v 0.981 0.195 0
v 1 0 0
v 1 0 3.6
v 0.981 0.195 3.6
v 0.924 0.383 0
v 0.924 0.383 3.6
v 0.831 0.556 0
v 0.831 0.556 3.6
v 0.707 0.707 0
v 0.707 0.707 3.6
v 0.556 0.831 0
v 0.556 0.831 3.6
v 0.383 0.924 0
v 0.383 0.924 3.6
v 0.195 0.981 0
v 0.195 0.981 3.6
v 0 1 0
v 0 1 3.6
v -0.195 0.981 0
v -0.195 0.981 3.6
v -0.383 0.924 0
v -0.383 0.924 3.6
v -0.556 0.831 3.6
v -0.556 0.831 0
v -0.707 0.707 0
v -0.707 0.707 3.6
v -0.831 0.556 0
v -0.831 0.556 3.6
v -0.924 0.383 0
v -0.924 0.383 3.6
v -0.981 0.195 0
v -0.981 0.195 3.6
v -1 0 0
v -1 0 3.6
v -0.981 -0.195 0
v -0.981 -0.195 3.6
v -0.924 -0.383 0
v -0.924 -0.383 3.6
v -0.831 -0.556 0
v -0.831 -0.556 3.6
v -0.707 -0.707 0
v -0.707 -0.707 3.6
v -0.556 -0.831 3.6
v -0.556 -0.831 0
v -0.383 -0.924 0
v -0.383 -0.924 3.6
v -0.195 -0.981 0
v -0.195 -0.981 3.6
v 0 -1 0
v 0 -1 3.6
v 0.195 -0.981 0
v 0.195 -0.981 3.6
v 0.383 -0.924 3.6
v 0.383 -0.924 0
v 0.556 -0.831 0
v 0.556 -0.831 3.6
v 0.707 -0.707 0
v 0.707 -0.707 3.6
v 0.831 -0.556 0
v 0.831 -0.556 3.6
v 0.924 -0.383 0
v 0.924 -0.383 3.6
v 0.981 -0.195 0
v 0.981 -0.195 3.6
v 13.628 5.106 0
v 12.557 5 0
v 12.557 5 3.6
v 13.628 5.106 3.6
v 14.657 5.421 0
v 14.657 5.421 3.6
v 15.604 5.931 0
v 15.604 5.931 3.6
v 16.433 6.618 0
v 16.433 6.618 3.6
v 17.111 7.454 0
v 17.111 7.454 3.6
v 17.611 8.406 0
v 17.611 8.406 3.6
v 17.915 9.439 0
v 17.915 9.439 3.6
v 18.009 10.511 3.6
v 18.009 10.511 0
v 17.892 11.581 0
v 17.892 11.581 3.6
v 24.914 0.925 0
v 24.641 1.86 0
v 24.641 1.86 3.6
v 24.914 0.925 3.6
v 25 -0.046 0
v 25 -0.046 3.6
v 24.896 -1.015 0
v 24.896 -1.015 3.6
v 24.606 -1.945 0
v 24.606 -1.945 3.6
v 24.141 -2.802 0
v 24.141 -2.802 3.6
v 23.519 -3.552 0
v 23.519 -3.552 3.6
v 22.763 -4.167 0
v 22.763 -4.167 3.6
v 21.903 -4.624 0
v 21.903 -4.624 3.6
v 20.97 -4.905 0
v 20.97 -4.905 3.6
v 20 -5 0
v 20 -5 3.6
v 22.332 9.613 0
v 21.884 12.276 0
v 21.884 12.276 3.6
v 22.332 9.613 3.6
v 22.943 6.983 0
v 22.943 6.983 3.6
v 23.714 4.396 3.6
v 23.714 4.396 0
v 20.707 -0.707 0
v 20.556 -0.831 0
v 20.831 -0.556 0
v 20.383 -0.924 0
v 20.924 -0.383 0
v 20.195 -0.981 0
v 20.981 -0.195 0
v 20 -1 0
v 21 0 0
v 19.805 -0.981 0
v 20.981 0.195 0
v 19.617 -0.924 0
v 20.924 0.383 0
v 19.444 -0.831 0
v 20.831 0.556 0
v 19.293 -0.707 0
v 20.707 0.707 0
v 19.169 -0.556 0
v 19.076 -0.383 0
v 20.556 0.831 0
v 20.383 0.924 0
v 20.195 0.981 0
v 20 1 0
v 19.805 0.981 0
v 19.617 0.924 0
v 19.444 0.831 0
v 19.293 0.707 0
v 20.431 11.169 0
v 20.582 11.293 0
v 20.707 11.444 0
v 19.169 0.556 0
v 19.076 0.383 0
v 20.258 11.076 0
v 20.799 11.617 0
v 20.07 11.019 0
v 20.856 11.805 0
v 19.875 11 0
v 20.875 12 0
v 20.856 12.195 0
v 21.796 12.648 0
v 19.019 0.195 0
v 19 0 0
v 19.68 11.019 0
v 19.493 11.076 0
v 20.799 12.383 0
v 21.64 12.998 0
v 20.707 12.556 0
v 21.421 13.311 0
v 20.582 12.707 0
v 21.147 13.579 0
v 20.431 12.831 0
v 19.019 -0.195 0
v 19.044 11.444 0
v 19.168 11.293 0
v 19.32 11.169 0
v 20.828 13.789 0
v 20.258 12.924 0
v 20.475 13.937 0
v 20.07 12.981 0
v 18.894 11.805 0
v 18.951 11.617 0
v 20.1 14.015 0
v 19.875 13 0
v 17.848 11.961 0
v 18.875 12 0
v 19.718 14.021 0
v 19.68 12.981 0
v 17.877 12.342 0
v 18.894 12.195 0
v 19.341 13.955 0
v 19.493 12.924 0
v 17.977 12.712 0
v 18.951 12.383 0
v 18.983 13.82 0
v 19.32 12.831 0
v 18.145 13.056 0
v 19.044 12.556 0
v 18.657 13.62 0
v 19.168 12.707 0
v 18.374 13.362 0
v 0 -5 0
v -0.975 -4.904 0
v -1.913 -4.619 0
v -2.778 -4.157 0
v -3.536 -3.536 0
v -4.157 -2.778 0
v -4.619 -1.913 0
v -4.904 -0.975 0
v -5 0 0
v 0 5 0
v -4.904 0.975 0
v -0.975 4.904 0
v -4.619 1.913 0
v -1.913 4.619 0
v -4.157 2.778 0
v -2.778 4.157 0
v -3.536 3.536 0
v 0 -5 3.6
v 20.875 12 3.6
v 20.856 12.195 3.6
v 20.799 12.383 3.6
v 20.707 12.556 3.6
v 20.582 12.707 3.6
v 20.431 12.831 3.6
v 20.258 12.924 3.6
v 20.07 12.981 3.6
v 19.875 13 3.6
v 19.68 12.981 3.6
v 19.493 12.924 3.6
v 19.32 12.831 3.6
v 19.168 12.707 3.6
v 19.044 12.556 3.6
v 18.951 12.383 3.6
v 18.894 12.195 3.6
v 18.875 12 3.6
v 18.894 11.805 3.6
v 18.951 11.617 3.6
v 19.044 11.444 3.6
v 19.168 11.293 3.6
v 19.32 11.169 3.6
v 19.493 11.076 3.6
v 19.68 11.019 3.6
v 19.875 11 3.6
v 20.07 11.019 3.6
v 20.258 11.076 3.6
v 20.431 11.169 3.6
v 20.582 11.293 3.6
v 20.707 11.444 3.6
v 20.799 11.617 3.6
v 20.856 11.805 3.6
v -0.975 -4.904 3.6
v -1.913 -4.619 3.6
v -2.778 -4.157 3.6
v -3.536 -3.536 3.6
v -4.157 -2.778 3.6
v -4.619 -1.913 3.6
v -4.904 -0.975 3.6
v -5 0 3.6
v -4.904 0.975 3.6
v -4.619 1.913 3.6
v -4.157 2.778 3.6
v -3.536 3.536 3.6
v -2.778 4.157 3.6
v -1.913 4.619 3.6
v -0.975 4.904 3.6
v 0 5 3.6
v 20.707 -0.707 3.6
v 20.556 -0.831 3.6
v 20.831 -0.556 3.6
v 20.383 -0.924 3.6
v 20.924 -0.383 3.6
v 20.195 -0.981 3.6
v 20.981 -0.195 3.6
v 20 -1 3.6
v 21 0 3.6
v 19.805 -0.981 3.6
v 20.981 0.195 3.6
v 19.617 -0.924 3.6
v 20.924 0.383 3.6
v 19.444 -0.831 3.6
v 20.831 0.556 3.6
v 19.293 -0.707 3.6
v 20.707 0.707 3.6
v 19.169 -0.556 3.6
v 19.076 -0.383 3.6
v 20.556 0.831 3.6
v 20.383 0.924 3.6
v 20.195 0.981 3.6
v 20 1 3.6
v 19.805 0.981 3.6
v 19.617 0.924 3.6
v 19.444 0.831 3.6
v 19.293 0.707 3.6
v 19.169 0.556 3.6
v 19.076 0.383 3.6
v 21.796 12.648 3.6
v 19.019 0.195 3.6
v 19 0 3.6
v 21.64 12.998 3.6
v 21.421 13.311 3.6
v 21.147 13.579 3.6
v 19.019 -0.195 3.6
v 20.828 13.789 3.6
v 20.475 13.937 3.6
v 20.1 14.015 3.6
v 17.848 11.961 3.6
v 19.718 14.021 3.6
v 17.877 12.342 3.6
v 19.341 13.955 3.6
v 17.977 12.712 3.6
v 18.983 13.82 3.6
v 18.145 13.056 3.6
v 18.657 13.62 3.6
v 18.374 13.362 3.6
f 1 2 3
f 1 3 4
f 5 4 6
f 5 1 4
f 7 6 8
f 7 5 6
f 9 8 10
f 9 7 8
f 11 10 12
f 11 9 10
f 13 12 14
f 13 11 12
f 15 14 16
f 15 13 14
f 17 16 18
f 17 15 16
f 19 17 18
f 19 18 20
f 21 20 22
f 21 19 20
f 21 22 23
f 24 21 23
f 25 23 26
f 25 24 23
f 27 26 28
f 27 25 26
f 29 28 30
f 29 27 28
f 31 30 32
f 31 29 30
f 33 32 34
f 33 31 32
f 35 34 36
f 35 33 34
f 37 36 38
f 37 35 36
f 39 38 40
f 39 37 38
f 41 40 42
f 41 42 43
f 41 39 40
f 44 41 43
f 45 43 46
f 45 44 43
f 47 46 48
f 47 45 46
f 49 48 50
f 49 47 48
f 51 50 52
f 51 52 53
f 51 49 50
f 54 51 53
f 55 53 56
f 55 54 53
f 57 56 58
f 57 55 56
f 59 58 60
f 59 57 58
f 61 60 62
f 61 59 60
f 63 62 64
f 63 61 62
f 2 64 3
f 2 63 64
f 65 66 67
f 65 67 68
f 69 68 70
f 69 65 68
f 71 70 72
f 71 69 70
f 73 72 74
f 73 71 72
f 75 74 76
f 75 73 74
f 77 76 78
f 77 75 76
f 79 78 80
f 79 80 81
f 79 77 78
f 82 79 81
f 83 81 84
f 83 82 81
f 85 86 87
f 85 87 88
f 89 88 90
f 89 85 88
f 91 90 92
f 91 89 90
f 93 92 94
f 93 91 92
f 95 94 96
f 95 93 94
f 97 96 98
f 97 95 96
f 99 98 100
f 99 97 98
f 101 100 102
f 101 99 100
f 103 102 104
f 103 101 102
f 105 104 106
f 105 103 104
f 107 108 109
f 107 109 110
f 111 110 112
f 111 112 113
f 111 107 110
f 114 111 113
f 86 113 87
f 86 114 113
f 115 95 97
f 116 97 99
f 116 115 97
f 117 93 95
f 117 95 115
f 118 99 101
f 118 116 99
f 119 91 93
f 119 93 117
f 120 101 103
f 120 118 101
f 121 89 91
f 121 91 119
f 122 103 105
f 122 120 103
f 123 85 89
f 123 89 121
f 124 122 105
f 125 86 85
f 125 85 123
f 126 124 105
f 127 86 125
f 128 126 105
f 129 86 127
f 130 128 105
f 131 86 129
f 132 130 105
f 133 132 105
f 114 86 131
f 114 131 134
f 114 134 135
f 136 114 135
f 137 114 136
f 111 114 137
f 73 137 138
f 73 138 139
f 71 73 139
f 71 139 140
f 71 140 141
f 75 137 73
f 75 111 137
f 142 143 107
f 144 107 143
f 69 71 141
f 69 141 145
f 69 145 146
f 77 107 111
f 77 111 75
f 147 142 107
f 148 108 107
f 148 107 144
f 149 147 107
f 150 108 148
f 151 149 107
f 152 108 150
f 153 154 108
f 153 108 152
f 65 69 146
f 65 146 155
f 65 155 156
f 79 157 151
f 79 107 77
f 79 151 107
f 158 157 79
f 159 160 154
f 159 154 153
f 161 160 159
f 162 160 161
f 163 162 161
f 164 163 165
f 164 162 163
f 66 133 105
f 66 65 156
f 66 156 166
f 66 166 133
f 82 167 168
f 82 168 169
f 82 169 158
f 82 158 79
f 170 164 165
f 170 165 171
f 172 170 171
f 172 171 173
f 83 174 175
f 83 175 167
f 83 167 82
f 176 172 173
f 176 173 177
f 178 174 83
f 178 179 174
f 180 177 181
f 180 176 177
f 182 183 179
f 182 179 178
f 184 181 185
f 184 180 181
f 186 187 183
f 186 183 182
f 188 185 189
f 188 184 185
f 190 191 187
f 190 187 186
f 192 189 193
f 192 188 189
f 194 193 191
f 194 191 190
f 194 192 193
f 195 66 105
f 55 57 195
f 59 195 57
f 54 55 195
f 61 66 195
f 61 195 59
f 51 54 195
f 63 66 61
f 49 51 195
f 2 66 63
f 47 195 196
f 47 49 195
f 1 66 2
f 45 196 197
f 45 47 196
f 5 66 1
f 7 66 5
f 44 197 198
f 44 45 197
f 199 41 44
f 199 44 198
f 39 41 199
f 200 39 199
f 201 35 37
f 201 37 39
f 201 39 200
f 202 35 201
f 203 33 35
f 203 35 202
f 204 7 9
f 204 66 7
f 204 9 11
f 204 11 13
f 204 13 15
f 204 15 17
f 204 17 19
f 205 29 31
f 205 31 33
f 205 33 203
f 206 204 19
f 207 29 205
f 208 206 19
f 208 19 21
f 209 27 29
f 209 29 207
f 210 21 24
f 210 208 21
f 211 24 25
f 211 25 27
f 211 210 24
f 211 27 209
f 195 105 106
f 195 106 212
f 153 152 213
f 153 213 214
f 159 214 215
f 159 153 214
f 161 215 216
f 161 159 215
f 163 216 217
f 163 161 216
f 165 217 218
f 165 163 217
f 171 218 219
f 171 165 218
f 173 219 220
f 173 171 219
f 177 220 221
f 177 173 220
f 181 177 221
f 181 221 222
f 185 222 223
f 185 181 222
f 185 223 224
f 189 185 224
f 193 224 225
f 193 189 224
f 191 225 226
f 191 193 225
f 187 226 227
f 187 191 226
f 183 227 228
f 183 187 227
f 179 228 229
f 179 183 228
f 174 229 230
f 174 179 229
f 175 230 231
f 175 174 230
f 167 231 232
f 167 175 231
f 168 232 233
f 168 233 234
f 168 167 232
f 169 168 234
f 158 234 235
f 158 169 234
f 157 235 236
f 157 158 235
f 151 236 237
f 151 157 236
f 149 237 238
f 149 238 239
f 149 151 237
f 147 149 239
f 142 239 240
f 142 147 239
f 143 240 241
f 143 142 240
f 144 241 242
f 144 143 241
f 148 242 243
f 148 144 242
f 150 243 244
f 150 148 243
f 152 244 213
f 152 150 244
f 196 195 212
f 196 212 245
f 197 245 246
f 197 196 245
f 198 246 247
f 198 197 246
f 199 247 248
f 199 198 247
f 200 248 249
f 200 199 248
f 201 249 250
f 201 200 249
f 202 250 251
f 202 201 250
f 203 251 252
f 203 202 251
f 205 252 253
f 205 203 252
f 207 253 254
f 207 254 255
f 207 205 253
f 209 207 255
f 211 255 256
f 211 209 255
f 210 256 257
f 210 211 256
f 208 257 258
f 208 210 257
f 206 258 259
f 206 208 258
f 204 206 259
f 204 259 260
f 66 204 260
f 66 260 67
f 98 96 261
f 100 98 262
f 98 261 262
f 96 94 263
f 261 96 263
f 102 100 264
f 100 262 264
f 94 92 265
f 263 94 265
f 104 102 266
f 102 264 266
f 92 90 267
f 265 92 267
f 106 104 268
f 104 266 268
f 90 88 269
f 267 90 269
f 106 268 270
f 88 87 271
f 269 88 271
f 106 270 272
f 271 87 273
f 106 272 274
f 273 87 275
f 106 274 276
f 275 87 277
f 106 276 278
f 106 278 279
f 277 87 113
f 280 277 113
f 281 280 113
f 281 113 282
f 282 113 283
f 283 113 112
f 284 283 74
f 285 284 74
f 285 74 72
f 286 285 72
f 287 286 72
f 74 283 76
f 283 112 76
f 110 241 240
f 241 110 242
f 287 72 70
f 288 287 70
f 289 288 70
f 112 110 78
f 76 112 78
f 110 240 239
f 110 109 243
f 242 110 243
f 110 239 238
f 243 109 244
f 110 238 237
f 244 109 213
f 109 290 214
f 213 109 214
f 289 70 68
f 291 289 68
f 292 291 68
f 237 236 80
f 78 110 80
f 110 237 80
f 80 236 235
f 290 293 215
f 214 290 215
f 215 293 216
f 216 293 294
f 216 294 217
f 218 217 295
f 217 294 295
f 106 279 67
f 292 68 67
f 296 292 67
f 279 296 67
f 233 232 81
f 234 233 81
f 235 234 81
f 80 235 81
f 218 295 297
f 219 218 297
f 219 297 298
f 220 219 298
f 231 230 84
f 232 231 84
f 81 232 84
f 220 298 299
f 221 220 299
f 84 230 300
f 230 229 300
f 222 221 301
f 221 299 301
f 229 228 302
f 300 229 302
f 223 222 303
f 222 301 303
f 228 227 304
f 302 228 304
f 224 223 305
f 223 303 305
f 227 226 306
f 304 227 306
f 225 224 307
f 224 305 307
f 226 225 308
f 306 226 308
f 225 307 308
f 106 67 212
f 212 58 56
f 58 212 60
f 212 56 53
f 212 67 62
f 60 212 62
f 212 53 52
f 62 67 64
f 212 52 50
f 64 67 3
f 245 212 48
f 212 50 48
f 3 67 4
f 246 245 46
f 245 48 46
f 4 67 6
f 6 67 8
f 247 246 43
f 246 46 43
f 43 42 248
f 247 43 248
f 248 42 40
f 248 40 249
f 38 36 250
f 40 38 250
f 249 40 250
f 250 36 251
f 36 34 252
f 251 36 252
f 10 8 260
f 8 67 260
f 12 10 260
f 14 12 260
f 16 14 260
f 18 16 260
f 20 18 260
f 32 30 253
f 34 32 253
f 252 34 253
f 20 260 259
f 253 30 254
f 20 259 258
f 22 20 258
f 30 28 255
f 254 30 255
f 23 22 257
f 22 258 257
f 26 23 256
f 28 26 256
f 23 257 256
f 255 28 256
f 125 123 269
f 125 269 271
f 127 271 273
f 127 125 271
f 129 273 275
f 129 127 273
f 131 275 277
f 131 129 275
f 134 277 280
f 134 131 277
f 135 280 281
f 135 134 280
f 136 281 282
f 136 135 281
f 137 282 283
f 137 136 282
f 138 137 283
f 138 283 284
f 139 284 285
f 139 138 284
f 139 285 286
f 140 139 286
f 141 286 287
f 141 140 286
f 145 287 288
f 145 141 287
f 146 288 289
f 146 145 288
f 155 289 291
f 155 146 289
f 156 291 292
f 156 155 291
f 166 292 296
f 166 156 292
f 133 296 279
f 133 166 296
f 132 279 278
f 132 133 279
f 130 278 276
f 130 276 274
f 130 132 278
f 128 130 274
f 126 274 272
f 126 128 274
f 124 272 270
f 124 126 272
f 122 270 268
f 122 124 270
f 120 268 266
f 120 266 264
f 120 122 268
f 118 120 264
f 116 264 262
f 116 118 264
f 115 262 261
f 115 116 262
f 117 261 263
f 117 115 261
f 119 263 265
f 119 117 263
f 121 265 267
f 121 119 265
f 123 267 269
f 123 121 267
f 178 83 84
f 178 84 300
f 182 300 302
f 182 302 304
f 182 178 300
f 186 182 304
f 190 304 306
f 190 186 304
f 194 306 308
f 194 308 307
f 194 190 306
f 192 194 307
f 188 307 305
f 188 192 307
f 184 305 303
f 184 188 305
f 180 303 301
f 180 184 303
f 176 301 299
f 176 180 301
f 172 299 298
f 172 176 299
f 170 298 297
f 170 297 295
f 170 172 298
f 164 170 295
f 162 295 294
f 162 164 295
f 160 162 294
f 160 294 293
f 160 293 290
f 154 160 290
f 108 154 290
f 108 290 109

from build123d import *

# Parameters (mm, degrees)
SKETCH1_R           = 1
BOSS_EXTRUDE1_DEPTH = 3.6


with BuildPart() as part:
    # Sketch1 → Boss-Extrude1 (new body)
    with BuildSketch(Plane.XY):
        with BuildLine():
            Line((0, 5), (12.556863352, 5))
            ThreePointArc((12.556863352, 5), (16.792661174, 7.018934049), (17.891852228, 11.580716256))
            ThreePointArc((17.891852228, 11.580716256), (19.527471102, 13.99714741), (21.883567401, 12.27575296))
            ThreePointArc((21.883567401, 12.27575296), (22.943328128, 6.983448401), (24.641136419, 1.860067939))
            ThreePointArc((24.641136419, 1.860067939), (24.141276355, -2.801754834), (20, -5))
            Line((20, -5), (0, -5))
            ThreePointArc((0, -5), (-5, 0), (0, 5))
        make_face()
        Circle(SKETCH1_R, mode=Mode.SUBTRACT)
        with Locations((20, 0)):
            Circle(SKETCH1_R, mode=Mode.SUBTRACT)
        with Locations((19.875214038, 12)):
            Circle(SKETCH1_R, mode=Mode.SUBTRACT)
    extrude(amount=BOSS_EXTRUDE1_DEPTH)


solid = part.part
